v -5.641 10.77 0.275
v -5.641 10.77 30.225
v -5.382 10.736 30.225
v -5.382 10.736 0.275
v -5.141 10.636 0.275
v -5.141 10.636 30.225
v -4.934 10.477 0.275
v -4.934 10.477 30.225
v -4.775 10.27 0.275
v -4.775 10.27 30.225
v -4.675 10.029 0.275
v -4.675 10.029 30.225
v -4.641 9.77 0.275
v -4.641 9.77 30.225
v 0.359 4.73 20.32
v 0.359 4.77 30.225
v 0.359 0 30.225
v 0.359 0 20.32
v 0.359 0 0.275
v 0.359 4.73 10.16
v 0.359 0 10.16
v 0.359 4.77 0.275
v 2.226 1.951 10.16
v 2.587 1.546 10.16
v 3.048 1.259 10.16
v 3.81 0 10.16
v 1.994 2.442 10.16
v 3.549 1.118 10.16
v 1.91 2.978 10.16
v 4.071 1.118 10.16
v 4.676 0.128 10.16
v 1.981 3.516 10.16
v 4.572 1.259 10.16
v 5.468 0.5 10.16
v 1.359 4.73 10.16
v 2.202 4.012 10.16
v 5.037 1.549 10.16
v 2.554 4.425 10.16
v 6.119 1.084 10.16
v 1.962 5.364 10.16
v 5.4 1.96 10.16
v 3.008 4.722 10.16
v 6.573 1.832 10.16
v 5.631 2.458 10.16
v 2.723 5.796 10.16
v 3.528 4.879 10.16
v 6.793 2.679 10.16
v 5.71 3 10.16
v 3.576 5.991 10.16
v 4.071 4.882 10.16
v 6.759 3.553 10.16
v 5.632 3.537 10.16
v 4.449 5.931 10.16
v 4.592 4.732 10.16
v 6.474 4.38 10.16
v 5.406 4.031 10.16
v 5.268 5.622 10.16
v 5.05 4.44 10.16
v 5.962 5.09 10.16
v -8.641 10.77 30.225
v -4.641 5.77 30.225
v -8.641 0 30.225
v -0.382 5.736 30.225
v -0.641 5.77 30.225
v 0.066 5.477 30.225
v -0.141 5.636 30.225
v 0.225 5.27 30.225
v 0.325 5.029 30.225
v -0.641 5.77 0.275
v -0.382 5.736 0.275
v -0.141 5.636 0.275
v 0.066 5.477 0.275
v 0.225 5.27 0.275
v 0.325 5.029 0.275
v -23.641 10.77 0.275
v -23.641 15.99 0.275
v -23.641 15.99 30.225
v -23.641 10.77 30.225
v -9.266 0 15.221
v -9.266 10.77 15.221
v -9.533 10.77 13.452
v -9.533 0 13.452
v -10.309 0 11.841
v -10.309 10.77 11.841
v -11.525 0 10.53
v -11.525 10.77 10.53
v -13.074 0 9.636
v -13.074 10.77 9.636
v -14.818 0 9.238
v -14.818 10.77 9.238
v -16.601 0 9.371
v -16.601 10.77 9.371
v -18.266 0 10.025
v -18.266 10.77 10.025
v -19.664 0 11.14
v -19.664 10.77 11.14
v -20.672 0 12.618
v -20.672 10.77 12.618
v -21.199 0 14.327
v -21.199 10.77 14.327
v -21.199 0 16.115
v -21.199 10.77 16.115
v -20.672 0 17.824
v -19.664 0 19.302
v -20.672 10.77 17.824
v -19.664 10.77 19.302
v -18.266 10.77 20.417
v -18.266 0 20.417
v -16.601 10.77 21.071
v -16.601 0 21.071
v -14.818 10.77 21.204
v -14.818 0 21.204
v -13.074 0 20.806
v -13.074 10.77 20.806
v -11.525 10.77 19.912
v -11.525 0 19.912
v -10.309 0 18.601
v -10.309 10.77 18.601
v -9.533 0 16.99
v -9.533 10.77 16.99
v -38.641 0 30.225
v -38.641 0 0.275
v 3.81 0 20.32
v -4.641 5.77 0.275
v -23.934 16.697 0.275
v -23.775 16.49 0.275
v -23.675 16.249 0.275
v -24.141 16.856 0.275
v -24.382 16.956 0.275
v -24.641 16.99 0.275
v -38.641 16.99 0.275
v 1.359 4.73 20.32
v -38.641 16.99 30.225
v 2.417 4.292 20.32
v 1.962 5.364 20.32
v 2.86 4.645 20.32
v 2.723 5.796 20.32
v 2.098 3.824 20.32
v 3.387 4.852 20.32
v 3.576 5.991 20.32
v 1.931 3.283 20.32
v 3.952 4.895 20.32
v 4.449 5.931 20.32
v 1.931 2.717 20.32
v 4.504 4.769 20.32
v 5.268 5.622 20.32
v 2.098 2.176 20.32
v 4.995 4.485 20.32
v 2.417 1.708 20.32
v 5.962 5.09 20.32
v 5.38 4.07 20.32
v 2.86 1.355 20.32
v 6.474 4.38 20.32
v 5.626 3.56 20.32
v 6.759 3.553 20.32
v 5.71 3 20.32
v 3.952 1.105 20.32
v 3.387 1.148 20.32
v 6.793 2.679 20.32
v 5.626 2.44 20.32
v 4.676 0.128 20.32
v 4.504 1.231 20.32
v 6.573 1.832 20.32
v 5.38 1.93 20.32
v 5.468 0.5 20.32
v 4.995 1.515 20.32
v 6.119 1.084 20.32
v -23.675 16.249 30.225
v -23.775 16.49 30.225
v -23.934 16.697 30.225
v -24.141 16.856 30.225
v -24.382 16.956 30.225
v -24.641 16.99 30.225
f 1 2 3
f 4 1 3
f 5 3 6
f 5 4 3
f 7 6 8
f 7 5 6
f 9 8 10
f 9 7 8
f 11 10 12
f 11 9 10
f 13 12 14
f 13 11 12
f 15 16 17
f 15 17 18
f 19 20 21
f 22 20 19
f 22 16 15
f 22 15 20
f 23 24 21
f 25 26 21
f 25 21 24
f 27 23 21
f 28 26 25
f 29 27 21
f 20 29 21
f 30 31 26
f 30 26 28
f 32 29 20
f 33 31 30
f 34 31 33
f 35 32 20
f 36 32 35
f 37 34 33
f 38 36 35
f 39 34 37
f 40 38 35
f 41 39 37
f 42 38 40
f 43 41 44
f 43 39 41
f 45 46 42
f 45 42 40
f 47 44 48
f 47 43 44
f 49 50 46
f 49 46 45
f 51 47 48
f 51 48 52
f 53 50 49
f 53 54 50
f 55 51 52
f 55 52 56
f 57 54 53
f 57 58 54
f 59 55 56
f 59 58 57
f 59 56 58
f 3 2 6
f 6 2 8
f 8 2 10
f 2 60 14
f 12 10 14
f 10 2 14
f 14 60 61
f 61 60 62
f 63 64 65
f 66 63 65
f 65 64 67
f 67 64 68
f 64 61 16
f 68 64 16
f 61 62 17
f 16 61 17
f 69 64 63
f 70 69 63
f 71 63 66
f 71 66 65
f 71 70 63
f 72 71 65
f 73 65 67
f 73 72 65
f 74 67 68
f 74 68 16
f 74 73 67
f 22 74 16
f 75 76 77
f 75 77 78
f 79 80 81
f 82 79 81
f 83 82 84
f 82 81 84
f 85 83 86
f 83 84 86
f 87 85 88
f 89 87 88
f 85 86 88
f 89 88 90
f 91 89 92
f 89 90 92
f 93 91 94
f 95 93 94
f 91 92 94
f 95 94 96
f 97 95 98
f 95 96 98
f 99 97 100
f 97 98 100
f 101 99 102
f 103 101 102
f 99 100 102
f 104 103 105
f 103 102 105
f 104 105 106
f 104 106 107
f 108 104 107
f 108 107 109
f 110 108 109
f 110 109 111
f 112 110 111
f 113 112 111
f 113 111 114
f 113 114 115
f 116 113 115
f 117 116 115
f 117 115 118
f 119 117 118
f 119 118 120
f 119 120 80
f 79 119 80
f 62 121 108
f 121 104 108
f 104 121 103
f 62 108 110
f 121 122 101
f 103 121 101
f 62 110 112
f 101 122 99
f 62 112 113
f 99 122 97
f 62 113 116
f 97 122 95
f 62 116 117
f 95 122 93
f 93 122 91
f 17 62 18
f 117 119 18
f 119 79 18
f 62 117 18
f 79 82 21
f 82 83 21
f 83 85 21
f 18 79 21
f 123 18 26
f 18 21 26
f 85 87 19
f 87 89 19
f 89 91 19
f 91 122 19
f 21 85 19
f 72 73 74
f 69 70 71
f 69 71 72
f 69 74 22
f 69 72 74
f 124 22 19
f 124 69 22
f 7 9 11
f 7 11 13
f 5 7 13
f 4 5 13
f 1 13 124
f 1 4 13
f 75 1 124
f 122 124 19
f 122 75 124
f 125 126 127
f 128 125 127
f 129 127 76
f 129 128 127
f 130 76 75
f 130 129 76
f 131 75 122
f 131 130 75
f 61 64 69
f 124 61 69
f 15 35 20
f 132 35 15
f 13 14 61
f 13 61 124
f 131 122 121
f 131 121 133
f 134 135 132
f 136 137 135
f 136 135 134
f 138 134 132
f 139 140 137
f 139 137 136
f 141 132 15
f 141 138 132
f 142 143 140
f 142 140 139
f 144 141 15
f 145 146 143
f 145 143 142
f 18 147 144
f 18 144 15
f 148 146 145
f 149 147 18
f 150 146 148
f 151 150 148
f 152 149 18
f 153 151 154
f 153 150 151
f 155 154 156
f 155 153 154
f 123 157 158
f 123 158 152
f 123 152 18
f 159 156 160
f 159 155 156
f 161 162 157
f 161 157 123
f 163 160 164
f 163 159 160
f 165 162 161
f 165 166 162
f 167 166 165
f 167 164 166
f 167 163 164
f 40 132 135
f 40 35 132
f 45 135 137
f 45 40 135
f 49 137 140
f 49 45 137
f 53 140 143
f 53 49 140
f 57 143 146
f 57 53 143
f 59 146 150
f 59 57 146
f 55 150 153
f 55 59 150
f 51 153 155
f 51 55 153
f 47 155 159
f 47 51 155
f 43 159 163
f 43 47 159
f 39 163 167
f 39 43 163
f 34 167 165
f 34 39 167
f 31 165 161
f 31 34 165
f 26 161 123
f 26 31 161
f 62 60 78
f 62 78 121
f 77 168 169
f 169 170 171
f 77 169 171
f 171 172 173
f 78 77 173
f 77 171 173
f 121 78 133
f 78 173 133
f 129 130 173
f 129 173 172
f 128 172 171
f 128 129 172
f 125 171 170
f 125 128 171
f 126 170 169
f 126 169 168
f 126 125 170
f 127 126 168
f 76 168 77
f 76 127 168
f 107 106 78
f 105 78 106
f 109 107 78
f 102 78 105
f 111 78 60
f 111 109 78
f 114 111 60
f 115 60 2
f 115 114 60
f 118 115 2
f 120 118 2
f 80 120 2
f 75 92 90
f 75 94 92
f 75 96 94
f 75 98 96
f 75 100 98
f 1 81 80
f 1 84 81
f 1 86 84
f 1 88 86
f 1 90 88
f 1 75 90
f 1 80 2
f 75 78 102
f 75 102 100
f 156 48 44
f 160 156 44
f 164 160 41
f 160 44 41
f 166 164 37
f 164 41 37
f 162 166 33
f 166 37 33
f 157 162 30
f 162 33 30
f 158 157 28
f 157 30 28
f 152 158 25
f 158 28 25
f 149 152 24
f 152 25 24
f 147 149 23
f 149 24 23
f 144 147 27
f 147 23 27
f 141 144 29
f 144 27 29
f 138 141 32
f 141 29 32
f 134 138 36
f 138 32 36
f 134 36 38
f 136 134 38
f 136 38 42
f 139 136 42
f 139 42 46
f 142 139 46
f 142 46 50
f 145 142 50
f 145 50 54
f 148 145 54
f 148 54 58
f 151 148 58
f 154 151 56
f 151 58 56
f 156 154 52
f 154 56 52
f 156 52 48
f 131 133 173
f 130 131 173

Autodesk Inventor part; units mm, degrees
ref_plane "YZ Plane" through (0, 0, 0) normal (1, 0, 0) x (0, 1, 0)
sketch "Sketch1" plane through (0, 0, 0) normal (0, 0, 1) x (1, 0, 0)
  line L0 (0, 0) -> (3.81, 0)
  line L1 (0, 0) -> (0, 1.27)
  arc A0 (3.81, 0) -> (1.359061, 1.27) centre (3.81, 3) ccw
  circle A1 centre (3.81, 3) radius 1.9
  line L2 (0, 1.27) -> (1.359061, 1.27)
  dimension "d0" = 3.81
  dimension "d1" = 1.27
  dimension "d2" = 6
  dimension "d3" = 3.8
extrude "Extrusion1" add sketch "Sketch1" along normal blind 30.48
ref_plane "Work Plane1" through (0, 0, 20.32) normal (0, 0, 1) x (1, 0, 0)
sketch "Sketch2" plane through (0, 0, 20.32) normal (0, 0, 1) x (1, 0, 0)
  arc A0 (3.81, 0) -> (1.359061, 1.27) centre (3.81, 3) ccw
  line L0 (2.54, 1.27) -> (2.54, 0)
  line L1 (0, 0) -> (3.81, 0)
  line L2 (2.54, 0) -> (3.81, 0)
  circle A1 centre (3.81, 3) radius 0.762
sketch "Sketch2 outline for Extrusion5" plane through (0, 0, 20.32) normal (0, 0, 1) x (1, 0, 0)
  line L0 (2.54, 0) -> (3.81, 0)
  line L1 (1.359061, 1.27) -> (2.54, 0)
  arc A0 (3.81, 0) -> (1.359061, 1.27) centre (3.81, 3) ccw
  circle A1 centre (3.81, 3) radius 0.762
extrude "Extrusion5" cut sketch "Sketch2 outline for Extrusion5" along normal blind 25.4
ref_plane "Work Plane3" through (0, 0, 10.16) normal (0, 0, -1) x (-1, 0, 0)
sketch "Sketch6" plane through (0, 0, 10.16) normal (0, 0, -1) x (-1, 0, 0)
  line L0 (-1.359061, 1.27) -> (-2.54, 0)
  line L1 (-1.359061, 1.27) -> (-2.54, 0)
  circle A0 centre (-3.81, 1.27) radius 0.762
  arc A1 (-1.359061, 1.27) -> (-3.81, 0) centre (-3.81, 3) ccw
  line L2 (-2.54, 0) -> (-3.81, 0)
  point P0 (0, 0)
extrude "Extrusion6" cut sketch "Sketch6" along normal blind 25.4
sketch "Sketch8" plane through (0, 0, 30.48) normal (0, 0, 1) x (1, 0, 0)
  line L0 (1.633512, 1.27) -> (1.633512, 0)
  line L1 (1.633512, 1.27) -> (1.633512, 0)
  line L2 (1.359061, 1.27) -> (2.54, 0)
  line L3 (1.633512, 0) -> (2.54, 0)
  line L4 (1.359061, 1.27) -> (0, 1.27)
  line L5 (2.54, 0) -> (1.633512, 1.27)
  point P0 (0, 0)
extrude "Extrusion8" cut sketch "Sketch8" against normal blind 10.16
sketch "Sketch9" plane through (0, 0, 0) normal (0, 0, -1) x (-1, 0, 0)
  arc A0 (-4.571927, 1.259464) -> (-3.048073, 1.259464) centre (-3.81, 1.27) ccw
  arc A1 (-4.571927, 1.259464) -> (-3.048073, 1.259464) centre (-3.81, 3) ccw
  point P0 (0, 0)
extrude "Extrusion9" cut sketch "Sketch9" against normal blind 10.16
sketch "Sketch10" plane through (0, 0, 0) normal (0, 0, -1) x (-1, 0, 0)
  line L0 (-1.359061, 1.27) -> (0, 1.27)
  line L1 (-1.359061, 1.27) -> (-1.359061, 0)
  line L2 (-1.359061, 0) -> (-2.542741, 0)
  line L3 (-2.542741, 0) -> (-1.359061, 1.27)
  point P0 (0, 0)
extrude "Extrusion10" cut sketch "Sketch10" against normal blind 10.16
sketch "Sketch11" plane through (0, 0, 30.48) normal (0, 0, 1) x (1, 0, 0)
  line L0 (1.359061, 1.27) -> (1.633512, 1.27)
  line L1 (1.359061, 1.27) -> (1.633512, 0.974851)
  line L2 (1.633512, 1.27) -> (1.633512, 0.974851)
  line L3 (1.633512, 0.974851) -> (1.359061, 1.27)
  point P0 (0, 0)
extrude "Extrusion11" add sketch "Sketch11" against normal blind 10.16
sketch "Sketch12" plane through (0, 1.27, 30.48) normal (0, 1, 0) x (1, 0, 0)
  line L0 (1.359061, 30.48) -> (1.359061, 20.32)
  line L1 (1.359061, 30.48) -> (-8.640939, 30.48)
  line L2 (-8.640939, 30.48) -> (-8.640939, 0)
  line L3 (-8.640939, 0) -> (1.359061, 0)
  line L4 (1.359061, 0) -> (1.359061, 30.48)
  point P0 (0, 30.48)
  dimension "d34" = 10
extrude "Extrusion12" add sketch "Sketch12" against normal blind 1.27
sketch "Sketch13" plane through (1.633512, 1.27, 30.48) normal (0, 1, 0) x (1, 0, 0)
  line L0 (-0.274451, 30.48) -> (-0.274451, 20.32)
  line L1 (-0.274451, 20.32) -> (-0.274451, 0)
  line L2 (-0.274451, 0) -> (1.648434, 0)
  line L3 (1.648434, 0) -> (1.648434, 10.16)
  line L4 (2.176488, 10.16) -> (0, 10.16)
  line L5 (-0.274451, 10.16) -> (1.648434, 10.16)
  point P0 (-1.633512, 30.48)
extrude "Extrusion13" cut sketch "Sketch13" against normal blind 1.27
sketch "Sketch14" plane through (1.359061, 0, 0) normal (1, 0, 0) x (0, 0, -1)
  line L0 (-30.474923, 6.35) -> (0.005077, 6.35)
  line L1 (0.005077, 6.35) -> (0.005077, 0)
  line L2 (0, 1.27) -> (-30.48, 1.27)
  line L3 (0, 1.27) -> (-30.474923, 1.27)
  line L4 (-30.474923, 1.27) -> (-30.474923, 5.77)
  line L5 (-30.474923, 5.77) -> (0, 5.77)
  line L6 (0, 5.77) -> (0, 1.27)
  point P0 (0, 0)
  dimension "d39" = 4.5
extrude "Extrusion14" add sketch "Sketch14" against normal blind 10
sketch "Sketch15" plane through (1.359061, 0, 20.32) normal (1, 0, 0) x (0, 0, -1)
  line L0 (-10.154923, 5.77) -> (20.32, 5.77)
  line L1 (20.32, 0) -> (20.07, 0)
  line L2 (20.07, 0) -> (20.07, 5.77)
  line L3 (20.07, 5.77) -> (20.32, 5.77)
  line L4 (20.32, 5.77) -> (20.32, 0)
  line L5 (-10.154923, 5.77) -> (20.32, 5.77)
  line L6 (5.082538, 5.77) -> (5.082538, 11.076995)
  line L7 (-10.154923, 0) -> (-9.904923, 0)
  line L8 (-9.904923, 0) -> (-9.904923, 5.77)
  line L9 (-10.154923, 5.77) -> (-10.154923, 0)
  line L10 (-10.154923, 0) -> (-9.904923, 0)
  line L11 (-9.904923, 0) -> (-9.904923, 5.77)
  line L12 (-9.904923, 5.77) -> (-10.154923, 5.77)
  line L13 (-10.154923, 5.77) -> (-10.154923, 0)
  dimension "d42" = 0.25
extrude "Extrusion15" cut sketch "Sketch15" against normal blind 10
sketch "Sketch16" plane through (1.359061, 0, 30.474923) normal (0, 0, -1) x (-1, 0, 0)
  line L0 (0, 1.27) -> (10, 1.27) projected
  line L1 (0, 0) -> (0, 1.27) projected
  line L2 (10, 0) -> (0, 0) projected
  line L3 (10, 1.27) -> (10, 0) projected
  point P0 (1.359061, 0)
extrude "Extrusion16" cut sketch "Sketch16" against normal blind 10
sketch "Sketch17" plane through (1.359061, 5.77, 30.224923) normal (0, 1, 0) x (1, 0, 0)
  line L0 (-5, 33.422895) -> (-5, -3.422186)
  line L1 (0, 29.974923) -> (-10, 29.974923)
  line L2 (-10, 0) -> (-10, 29.974923)
  line L3 (-5, 29.974923) -> (-10, 29.974923)
  line L4 (-10, 29.974923) -> (-10, 0)
  line L5 (-10, 0) -> (-5, 0)
  line L6 (-5, 0) -> (-5, 29.974923)
  point P0 (-1.359061, 30.224923)
extrude "Extrusion17" add sketch "Sketch17" along normal blind 5
sketch "Sketch18" plane through (1.359061, 0, 0.25) normal (0, 0, -1) x (-1, 0, 0)
  line L0 (40, 0) -> (40, 21.034494)
  line L1 (40, 37.49) -> (40, 17.49)
  line L2 (10, 10.77) -> (5, 10.77)
  line L3 (10, 10.77) -> (40, 10.77)
  line L4 (40, 10.77) -> (40, 0)
  line L5 (40, 0) -> (10, 0)
  line L6 (10, 0) -> (10, 10.77)
  line L7 (25, 10.77) -> (40, 10.77)
  line L8 (40, 10.77) -> (40, 17.49)
  line L9 (40, 17.49) -> (25, 17.49)
  line L10 (25, 17.49) -> (25, 10.77)
  point P0 (1.359061, 0)
extrude "Extrusion18" add sketch "Sketch18" against normal blind 29.975
sketch "Sketch19" plane through (1.359061, 10.77, 30.224923) normal (0, 1, 0) x (1, 0, 0)
  circle A0 centre (-16.625, 15.003923) radius 6
  circle A1 centre (-16.625, 15.003923) radius 4.85
  point P0 (-1.359061, 30.224923)
  dimension "d51" = 12
extrude "Extrusion19" cut sketch "Sketch19" against normal blind 29.975 contours A0 | A1
sketch "Sketch20" plane through (1.359061, 0, 30.225) normal (0, 0, 1) x (1, 0, 0)
  line L0 (-25, 17.49) -> (-25, 10.77) projected
  line L1 (-40, 0) -> (-40, 17.49) projected
  line L2 (-25, 17.49) -> (-40, 17.49)
  line L3 (-40, 17.49) -> (-40, 16.99)
  line L4 (-40, 16.99) -> (-25, 16.99)
  line L5 (-25, 16.99) -> (-25, 17.49)
  point P0 (-1.359061, 0)
  dimension "d54" = 0.5
extrude "Extrusion20" cut sketch "Sketch20" against normal blind 584.2
sketch "Sketch21" plane through (1.359061, 0, 20.32) normal (1, 0, 0) x (0, 0, -1)
  line L0 (20.07, 0) -> (20.07, 5.77)
  line L1 (-9.904923, 5.77) -> (20.07, 5.77)
  line L2 (-9.904923, 5.77) -> (-9.904923, 0)
  line L3 (0, 0) -> (-9.904923, 0)
  line L4 (0, 4.73) -> (0, 0)
  line L5 (10.16, 4.73) -> (0, 4.73)
  line L6 (10.16, 0) -> (10.16, 4.73)
  line L7 (20.07, 0) -> (10.16, 0)
  point P0 (20.32, 0)
extrude "Extrusion21" cut sketch "Sketch21" against normal blind 1
sketch "Sketch22" plane through (-3.640939, 5.77, 30.224923) normal (1, 0, 0) x (0, 0, -1)
  line L0 (0, 0) -> (0, 5)
  line L1 (0, 5) -> (29.974923, 5)
  line L2 (29.974923, 0) -> (29.974923, 5)
  line L3 (29.974923, 0) -> (0, 0)
  point P0 (30.224923, -5.77)
extrude "Extrusion22" cut sketch "Sketch22" against normal blind 1
fillet "Fillet1" radius 1 3 edges at (-23.6409, 16.99, 15.2375) (-4.6409, 10.77, 15.2375) (0.3591, 5.77, 15.2375)
sketch "Sketch23" plane through (1.359061, 0, 30.225) normal (0, 0, 1) x (1, 0, 0)
  spline S0 degree 3 poles (-15.287382, 7.562173) (-14.295298, 10.29556) (-13.653422, 13.152751) (-13.101138, 18.99204) (-13.207044, 21.960303) (-14.220005, 28.120528) (-15.237278, 31.317012) (-16.686921, 34.297861) knots -3.03465801 -3.03465801 -3.03465801 -3.03465801 -2.16997566 -2.16997566 -1.29383861 -1.29383861 -0.2991038 -0.2991038 -0.2991038 -0.2991038
  arc A0 (-25, 15.99) -> (-26, 16.99) centre (-26, 15.99) ccw
  line L0 (-26, 16.99) -> (-40, 16.99)
  line L1 (-40, 16.99) -> (-40, 0)
  line L2 (-40, 0) -> (-10, 0)
  line L3 (-10, 0) -> (-10, 10.77)
  line L4 (-10, 10.77) -> (-25, 10.77)
  line L5 (-25, 10.77) -> (-25, 15.99)
  arc A1 (-1, 4.77) -> (-2, 5.77) centre (-2, 4.77) ccw
  line L6 (-6, 5.77) -> (-2, 5.77)
  line L7 (-6, 5.77) -> (-6, 9.77)
  arc A2 (-6, 9.77) -> (-7, 10.77) centre (-7, 9.77) ccw
  line L8 (-10, 10.77) -> (-7, 10.77)
  line L9 (-10, 0) -> (-10, 10.77)
  line L10 (-1, 0) -> (-10, 0)
  line L11 (-1, 0) -> (-1, 4.77)
  point P0 (-1.359061, 0)
extrude "Extrusion23" add sketch "Sketch23" against normal blind 0.025
sketch "Sketch24" plane through (-38.640939, 0, 0.25) normal (0, 0, -1) x (-1, 0, 0)
  arc A0 (-38, 5.77) -> (-39, 4.77) centre (-38, 4.77) ccw projected
  line L0 (-39, 4.77) -> (-39, 0) projected
  line L1 (-39, 0) -> (0, 0) projected
  line L2 (0, 0) -> (0, 16.99) projected
  line L3 (0, 16.99) -> (-14, 16.99) projected
  arc A1 (-14, 16.99) -> (-15, 15.99) centre (-14, 15.99) ccw projected
  line L4 (-15, 15.99) -> (-15, 10.77) projected
  line L5 (-33, 10.77) -> (-15, 10.77) projected
  arc A2 (-33, 10.77) -> (-34, 9.77) centre (-33, 9.77) ccw projected
  line L6 (-34, 9.77) -> (-34, 5.77) projected
  line L7 (-38, 5.77) -> (-34, 5.77) projected
  point P0 (-38.640939, 0)
extrude "Extrusion24" cut sketch "Sketch24" against normal blind 0.025
properties part number "Hinge, Explosion Button"
